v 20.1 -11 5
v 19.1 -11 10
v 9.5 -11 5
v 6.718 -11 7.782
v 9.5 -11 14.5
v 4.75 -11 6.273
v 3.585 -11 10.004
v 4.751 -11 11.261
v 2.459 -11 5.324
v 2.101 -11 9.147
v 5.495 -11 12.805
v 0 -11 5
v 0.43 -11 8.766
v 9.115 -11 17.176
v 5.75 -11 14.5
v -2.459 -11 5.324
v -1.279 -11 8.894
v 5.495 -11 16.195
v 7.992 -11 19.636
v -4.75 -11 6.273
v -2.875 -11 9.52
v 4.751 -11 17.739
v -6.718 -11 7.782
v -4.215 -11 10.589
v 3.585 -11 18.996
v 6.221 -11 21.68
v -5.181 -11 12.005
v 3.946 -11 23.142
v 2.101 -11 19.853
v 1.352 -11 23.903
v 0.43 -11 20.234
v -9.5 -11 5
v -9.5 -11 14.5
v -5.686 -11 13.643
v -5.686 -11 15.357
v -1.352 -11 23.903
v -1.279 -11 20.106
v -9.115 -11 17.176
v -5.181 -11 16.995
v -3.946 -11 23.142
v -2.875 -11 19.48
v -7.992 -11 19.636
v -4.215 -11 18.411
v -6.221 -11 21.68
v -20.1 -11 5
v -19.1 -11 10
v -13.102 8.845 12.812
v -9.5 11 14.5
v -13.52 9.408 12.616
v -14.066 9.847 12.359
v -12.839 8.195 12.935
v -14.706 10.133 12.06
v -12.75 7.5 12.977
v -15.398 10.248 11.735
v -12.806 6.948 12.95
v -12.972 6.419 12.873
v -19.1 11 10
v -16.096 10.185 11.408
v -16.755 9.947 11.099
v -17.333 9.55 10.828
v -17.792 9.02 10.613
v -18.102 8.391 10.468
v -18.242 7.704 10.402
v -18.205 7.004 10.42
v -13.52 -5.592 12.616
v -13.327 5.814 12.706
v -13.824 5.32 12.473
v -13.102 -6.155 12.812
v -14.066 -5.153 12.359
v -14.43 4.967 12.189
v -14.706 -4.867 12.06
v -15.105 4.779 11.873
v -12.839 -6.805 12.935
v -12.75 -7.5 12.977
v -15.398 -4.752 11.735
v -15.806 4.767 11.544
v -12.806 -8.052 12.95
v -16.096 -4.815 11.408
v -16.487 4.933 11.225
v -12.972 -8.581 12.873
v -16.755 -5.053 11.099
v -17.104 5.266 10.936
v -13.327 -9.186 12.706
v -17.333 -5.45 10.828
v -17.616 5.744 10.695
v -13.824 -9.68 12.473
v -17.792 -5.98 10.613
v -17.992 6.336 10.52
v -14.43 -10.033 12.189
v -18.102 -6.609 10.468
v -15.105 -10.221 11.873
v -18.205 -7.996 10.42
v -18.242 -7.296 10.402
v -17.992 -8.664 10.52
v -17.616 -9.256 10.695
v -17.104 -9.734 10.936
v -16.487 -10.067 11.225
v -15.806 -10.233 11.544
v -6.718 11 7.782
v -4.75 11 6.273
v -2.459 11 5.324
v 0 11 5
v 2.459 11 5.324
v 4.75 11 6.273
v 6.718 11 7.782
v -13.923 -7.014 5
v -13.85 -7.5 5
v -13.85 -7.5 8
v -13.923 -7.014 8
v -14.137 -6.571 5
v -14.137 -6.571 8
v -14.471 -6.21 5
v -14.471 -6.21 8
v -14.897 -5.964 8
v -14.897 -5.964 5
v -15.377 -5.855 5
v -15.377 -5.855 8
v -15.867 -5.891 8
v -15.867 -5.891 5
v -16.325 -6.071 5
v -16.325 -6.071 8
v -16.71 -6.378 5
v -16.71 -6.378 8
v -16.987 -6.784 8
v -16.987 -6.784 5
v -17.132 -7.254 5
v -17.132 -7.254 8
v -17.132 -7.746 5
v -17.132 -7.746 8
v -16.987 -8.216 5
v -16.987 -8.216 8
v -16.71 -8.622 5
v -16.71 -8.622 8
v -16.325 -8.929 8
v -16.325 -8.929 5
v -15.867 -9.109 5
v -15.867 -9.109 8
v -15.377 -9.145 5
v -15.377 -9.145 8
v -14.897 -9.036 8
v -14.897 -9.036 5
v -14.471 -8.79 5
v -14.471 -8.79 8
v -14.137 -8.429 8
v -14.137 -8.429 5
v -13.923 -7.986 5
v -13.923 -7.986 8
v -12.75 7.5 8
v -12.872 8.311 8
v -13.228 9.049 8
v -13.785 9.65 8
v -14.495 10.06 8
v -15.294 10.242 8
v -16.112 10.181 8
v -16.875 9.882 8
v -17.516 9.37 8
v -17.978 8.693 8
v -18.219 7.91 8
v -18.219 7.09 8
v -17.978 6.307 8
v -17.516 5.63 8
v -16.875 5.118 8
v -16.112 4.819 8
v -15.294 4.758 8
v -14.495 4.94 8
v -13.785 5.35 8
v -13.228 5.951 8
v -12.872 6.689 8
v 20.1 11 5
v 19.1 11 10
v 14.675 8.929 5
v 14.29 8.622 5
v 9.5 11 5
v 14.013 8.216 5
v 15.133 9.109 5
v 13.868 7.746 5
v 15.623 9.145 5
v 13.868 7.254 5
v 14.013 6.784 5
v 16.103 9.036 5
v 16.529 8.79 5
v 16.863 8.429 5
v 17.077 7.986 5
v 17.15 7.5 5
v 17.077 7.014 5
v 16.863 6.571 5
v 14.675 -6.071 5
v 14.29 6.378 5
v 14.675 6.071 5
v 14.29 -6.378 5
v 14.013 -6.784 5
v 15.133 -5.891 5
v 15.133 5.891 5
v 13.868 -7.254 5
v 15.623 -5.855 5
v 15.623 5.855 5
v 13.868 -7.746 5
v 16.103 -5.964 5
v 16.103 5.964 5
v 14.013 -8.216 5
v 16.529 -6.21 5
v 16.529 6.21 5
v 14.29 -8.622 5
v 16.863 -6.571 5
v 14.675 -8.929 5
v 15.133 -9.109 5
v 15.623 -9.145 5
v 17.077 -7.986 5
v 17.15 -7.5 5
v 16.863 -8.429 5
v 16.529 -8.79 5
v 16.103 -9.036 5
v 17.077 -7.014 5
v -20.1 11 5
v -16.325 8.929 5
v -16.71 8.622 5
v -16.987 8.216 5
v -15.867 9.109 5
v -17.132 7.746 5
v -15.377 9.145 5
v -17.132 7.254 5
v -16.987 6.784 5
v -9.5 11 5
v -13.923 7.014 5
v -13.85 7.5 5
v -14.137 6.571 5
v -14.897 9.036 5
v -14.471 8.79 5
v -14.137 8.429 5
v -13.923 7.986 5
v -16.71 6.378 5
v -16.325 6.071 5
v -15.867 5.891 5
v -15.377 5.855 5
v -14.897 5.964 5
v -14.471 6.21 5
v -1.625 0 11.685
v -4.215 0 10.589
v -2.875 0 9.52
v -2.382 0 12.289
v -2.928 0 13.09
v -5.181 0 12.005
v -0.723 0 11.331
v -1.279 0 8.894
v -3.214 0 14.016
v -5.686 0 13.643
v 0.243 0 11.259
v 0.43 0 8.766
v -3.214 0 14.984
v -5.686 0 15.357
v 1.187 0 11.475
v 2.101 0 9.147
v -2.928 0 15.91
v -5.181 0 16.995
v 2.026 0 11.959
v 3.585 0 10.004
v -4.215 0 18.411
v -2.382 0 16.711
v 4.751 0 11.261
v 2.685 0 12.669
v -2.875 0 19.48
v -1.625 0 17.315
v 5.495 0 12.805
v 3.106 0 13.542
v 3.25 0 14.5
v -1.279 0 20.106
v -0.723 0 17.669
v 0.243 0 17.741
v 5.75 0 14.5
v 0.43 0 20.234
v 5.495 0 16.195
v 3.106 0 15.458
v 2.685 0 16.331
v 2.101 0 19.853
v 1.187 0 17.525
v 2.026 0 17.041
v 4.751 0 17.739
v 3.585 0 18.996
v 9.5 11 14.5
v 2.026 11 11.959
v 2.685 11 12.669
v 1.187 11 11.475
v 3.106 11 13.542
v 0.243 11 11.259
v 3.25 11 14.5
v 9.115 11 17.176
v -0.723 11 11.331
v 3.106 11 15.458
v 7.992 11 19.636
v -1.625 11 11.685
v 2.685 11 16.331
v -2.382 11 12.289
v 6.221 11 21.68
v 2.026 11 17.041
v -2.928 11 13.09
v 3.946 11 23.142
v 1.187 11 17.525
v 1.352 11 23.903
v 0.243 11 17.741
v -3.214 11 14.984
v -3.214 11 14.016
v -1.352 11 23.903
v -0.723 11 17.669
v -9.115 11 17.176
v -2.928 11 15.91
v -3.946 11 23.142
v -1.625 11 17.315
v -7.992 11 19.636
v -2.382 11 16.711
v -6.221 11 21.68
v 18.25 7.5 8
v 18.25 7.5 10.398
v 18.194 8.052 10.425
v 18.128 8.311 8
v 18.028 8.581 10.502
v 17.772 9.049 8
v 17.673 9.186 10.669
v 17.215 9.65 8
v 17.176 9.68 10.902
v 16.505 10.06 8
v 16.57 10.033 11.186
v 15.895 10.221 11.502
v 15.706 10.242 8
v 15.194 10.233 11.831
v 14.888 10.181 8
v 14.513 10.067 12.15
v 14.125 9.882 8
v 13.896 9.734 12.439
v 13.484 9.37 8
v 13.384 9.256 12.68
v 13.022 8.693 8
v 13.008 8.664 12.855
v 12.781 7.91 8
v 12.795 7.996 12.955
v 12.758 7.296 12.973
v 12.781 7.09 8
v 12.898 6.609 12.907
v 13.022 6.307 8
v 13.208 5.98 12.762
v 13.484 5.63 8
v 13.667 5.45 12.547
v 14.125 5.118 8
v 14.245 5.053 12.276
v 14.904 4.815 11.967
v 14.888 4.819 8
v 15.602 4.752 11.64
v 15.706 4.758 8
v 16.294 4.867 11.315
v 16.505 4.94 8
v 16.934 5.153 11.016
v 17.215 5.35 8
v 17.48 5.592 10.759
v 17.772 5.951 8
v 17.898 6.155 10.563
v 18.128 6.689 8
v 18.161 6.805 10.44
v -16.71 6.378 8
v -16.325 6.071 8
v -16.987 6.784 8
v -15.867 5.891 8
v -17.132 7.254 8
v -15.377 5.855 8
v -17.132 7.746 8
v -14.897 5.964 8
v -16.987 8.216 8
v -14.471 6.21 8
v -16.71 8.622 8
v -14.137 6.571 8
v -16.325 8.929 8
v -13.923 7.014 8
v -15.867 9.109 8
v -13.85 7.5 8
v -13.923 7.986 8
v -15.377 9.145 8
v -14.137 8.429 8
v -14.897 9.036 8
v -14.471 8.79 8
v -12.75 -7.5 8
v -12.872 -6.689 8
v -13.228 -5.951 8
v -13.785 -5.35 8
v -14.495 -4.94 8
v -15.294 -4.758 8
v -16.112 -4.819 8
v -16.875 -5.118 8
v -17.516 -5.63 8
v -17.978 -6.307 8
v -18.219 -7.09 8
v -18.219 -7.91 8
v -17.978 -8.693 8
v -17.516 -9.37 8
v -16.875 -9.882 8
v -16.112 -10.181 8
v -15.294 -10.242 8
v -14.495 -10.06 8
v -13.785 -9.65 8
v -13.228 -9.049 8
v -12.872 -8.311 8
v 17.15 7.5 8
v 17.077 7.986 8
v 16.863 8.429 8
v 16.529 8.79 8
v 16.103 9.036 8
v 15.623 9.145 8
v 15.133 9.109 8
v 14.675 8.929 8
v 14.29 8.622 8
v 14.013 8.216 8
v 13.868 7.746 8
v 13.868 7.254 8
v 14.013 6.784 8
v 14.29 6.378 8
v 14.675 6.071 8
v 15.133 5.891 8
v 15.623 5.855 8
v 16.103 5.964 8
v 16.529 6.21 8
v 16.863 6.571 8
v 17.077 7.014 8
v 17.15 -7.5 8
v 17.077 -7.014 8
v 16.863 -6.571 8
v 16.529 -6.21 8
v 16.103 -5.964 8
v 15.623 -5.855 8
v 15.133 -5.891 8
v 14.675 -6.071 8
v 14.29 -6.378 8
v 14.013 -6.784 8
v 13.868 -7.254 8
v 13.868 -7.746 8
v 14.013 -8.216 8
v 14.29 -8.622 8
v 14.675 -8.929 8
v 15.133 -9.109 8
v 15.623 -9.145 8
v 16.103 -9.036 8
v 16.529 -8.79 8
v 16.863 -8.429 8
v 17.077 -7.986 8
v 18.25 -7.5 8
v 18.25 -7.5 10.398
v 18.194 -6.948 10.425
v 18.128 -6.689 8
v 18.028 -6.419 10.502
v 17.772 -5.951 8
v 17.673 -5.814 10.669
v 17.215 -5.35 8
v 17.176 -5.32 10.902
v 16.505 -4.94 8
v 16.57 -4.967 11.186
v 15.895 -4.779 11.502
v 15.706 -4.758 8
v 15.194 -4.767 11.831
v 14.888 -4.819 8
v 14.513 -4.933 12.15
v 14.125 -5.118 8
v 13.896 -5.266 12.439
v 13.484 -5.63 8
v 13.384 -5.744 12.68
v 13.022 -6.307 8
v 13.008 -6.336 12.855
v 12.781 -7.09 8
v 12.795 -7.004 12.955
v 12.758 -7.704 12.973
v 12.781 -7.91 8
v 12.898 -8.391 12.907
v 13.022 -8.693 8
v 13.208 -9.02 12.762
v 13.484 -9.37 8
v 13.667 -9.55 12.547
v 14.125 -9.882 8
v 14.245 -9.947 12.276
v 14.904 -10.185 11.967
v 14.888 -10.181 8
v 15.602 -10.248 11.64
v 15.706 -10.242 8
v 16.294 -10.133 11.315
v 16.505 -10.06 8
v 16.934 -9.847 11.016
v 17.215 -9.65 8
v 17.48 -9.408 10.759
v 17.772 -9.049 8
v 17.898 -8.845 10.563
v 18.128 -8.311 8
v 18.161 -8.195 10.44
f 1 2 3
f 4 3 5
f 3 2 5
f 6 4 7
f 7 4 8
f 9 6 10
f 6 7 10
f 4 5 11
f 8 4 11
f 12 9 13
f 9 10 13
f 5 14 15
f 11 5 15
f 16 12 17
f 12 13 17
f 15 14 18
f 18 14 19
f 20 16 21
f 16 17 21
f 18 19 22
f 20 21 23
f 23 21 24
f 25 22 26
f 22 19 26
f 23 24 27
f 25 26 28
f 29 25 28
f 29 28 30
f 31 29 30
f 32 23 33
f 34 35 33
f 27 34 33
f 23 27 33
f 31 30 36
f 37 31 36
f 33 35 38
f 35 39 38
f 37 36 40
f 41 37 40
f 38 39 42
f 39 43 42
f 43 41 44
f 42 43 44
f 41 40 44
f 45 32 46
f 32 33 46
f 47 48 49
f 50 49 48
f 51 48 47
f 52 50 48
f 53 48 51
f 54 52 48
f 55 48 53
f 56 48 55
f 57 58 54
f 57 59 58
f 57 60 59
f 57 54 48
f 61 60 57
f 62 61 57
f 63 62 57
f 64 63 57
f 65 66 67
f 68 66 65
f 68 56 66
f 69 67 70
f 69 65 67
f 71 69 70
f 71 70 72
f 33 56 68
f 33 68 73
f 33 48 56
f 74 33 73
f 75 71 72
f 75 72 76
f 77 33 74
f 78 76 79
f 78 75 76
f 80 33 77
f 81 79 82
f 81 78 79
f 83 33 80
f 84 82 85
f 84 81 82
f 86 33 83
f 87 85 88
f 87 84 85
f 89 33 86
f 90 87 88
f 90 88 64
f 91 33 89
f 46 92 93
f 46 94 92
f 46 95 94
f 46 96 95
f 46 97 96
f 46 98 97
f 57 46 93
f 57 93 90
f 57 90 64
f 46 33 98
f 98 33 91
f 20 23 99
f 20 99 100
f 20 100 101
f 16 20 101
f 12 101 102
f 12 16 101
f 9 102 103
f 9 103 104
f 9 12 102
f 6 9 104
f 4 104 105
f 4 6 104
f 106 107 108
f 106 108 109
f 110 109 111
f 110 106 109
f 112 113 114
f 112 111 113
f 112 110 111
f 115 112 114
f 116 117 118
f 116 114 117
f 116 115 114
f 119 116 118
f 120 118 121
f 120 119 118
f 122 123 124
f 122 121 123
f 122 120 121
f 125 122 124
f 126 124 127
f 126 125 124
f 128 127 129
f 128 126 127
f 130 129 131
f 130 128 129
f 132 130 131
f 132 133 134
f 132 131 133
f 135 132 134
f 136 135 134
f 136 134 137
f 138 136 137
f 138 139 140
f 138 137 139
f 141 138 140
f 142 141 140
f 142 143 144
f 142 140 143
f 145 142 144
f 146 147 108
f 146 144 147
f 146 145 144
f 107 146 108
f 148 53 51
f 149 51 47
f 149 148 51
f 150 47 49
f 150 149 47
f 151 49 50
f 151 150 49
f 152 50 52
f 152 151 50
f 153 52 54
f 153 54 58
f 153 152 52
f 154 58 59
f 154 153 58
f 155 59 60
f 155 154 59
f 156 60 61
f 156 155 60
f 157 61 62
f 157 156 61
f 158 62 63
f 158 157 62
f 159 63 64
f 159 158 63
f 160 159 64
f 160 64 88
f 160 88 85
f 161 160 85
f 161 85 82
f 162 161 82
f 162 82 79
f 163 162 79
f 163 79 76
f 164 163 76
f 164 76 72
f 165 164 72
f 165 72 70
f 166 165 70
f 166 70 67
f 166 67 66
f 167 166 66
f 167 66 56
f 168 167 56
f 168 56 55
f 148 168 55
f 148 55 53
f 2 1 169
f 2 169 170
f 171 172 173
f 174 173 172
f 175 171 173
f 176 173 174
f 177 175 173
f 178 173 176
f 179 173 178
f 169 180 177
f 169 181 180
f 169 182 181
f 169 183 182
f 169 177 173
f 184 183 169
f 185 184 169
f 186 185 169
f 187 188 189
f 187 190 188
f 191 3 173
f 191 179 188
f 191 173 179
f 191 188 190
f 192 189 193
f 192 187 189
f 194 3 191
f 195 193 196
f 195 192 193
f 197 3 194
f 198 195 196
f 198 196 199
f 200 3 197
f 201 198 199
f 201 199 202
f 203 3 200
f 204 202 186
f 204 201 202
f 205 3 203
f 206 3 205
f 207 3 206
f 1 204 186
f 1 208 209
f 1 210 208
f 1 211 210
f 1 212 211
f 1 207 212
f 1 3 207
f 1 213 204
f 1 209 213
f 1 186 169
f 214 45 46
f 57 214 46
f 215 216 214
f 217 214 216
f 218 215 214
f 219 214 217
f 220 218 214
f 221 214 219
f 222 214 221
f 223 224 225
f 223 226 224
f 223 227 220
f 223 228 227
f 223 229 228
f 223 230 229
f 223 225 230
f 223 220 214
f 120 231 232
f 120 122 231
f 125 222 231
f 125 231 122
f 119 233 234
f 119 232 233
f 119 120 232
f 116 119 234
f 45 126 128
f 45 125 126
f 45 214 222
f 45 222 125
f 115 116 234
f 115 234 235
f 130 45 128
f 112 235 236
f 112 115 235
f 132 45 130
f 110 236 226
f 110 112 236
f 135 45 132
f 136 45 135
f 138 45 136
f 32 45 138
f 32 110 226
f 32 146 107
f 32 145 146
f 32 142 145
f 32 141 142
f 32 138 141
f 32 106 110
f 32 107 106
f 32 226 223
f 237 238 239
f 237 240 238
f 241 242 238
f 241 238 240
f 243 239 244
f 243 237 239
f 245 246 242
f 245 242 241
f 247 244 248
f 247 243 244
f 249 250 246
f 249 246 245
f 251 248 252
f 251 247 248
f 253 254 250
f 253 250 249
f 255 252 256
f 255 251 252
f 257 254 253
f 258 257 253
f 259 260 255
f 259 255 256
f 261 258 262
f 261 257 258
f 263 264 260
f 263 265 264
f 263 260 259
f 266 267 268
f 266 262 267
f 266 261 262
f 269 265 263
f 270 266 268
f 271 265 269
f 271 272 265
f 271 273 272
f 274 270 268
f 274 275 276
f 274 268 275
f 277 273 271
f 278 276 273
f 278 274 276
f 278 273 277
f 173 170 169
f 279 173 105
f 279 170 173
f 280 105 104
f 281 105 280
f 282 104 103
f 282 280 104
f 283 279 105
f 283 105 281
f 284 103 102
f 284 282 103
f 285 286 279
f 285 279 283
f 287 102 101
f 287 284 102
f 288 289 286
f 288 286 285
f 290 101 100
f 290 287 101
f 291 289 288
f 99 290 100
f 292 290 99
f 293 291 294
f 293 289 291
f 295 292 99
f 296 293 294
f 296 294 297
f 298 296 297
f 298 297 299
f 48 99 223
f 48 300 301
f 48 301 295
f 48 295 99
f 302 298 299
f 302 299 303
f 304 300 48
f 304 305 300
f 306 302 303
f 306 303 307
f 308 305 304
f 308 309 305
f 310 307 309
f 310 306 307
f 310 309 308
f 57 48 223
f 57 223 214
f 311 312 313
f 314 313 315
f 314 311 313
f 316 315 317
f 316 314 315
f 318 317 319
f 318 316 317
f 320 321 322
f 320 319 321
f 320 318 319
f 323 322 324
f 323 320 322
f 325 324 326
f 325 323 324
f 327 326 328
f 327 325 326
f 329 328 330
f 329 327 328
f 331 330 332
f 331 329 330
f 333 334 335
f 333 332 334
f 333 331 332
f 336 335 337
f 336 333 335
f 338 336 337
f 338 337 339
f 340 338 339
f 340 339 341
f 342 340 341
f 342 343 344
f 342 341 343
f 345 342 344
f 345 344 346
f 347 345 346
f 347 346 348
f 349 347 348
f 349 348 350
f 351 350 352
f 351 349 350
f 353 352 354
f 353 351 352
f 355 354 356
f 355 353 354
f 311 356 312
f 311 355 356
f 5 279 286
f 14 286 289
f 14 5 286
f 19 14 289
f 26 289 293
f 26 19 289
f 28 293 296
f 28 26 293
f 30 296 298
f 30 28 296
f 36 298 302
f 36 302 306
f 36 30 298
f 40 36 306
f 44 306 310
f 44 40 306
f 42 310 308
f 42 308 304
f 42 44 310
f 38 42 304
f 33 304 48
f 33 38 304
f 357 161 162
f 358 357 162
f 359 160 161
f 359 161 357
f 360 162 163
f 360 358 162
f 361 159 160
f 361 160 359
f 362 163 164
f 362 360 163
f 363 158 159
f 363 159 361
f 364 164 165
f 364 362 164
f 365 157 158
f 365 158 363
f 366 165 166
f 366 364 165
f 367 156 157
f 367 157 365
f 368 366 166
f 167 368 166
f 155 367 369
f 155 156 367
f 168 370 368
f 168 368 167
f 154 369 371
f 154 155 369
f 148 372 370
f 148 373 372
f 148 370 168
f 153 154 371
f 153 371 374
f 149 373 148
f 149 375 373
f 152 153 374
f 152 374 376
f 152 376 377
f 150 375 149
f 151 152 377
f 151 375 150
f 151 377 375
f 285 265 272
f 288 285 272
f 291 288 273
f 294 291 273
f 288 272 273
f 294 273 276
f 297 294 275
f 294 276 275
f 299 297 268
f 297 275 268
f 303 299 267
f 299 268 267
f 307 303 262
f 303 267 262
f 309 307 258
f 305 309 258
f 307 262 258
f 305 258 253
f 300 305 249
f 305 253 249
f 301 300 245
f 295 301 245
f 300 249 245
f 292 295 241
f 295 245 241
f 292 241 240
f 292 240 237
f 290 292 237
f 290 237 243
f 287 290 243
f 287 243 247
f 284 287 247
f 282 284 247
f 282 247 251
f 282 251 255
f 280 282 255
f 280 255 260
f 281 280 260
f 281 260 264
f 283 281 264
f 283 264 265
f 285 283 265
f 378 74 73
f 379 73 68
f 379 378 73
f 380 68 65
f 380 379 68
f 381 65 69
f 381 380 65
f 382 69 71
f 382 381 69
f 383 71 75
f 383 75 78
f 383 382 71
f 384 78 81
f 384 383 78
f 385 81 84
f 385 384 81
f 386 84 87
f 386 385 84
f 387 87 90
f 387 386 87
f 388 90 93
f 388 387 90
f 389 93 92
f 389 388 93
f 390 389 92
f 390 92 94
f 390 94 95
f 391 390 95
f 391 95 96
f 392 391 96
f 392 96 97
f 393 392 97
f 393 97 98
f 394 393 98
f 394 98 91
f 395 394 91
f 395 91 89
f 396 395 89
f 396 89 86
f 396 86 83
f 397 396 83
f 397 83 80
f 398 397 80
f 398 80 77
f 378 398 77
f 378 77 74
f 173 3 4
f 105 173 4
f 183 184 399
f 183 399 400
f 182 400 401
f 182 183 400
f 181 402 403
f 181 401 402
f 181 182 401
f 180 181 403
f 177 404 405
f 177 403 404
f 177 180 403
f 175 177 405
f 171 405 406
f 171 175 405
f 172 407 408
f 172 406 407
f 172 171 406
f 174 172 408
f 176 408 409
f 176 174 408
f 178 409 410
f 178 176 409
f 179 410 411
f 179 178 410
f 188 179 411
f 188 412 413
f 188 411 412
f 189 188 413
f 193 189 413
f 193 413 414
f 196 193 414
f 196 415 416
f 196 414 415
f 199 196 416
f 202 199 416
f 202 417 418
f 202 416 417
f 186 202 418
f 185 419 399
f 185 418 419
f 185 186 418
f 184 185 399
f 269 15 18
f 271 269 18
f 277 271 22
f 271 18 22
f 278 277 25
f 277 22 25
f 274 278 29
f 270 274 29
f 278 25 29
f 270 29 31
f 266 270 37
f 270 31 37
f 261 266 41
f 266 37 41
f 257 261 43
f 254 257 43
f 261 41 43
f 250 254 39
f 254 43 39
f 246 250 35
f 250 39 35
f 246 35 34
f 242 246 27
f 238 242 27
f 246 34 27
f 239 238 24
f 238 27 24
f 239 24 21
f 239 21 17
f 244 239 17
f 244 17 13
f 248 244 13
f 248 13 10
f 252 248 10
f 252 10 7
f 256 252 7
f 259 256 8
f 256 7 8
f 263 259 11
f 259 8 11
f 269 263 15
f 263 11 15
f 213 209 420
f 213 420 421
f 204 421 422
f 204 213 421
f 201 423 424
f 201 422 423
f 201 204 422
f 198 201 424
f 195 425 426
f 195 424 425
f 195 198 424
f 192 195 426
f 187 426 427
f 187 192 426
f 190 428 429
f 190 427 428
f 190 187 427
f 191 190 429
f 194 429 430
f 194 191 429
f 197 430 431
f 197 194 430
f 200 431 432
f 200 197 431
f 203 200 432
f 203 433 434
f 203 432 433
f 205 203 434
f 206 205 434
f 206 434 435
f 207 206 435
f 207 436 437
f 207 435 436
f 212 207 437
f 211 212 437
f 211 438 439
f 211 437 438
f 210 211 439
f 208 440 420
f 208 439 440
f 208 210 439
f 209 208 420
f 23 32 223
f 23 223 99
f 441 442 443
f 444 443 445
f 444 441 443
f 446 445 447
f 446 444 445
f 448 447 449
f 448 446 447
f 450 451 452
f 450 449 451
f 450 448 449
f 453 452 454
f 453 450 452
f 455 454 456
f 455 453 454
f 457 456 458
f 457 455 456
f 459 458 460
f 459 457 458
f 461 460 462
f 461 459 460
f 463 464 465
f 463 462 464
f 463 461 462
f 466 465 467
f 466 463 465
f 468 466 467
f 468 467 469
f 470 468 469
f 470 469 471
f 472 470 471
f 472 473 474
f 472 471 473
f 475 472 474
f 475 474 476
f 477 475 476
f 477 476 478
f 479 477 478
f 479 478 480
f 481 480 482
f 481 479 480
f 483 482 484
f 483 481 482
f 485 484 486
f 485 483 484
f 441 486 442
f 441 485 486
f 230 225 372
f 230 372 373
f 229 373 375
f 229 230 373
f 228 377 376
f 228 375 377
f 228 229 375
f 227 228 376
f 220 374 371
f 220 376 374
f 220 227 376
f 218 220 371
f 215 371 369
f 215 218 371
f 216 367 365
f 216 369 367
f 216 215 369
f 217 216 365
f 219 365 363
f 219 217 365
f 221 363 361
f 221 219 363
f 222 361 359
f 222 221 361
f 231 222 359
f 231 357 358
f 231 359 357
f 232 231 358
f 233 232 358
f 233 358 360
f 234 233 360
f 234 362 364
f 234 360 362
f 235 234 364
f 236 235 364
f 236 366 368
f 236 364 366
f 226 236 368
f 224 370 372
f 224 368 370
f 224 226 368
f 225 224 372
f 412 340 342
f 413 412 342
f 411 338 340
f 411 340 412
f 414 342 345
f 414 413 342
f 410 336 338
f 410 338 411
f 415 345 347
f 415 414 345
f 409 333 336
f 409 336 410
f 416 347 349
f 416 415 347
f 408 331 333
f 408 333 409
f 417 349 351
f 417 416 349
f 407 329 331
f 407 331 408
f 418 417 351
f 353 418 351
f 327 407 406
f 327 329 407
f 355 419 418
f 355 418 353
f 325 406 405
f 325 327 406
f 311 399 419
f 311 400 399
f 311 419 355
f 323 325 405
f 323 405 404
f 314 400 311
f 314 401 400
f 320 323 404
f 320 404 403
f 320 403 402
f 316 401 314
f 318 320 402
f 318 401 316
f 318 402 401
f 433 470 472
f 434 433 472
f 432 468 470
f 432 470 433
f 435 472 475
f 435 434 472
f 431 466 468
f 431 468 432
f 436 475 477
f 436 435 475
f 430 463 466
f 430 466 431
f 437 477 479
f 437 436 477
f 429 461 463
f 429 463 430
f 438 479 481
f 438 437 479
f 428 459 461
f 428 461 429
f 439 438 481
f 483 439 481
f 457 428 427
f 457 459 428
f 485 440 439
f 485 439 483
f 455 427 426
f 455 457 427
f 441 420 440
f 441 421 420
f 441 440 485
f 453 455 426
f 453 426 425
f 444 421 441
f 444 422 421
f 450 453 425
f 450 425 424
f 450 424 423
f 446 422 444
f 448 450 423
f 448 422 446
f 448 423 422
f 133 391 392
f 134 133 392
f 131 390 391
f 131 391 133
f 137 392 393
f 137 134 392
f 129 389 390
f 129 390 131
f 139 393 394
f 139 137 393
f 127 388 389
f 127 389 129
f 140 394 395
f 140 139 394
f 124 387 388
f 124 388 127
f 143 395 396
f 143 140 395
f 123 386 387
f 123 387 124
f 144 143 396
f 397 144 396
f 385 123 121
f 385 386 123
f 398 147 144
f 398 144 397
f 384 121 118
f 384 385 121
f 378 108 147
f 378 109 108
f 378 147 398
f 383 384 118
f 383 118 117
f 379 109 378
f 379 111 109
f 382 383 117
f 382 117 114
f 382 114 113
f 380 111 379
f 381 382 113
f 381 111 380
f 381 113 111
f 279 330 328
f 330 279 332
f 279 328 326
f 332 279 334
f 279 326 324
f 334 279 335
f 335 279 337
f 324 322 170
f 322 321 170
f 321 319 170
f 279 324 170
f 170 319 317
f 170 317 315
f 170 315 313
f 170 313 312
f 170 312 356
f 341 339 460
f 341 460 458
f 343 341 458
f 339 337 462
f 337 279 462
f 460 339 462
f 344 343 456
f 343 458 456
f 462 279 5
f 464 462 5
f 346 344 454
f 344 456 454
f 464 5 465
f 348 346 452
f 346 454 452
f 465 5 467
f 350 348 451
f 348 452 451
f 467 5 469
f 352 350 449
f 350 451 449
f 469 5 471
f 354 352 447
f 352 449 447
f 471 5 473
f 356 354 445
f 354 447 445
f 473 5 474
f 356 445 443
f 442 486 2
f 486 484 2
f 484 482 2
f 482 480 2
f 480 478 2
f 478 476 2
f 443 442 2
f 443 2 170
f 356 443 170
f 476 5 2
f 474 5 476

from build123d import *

# Parameters (mm, degrees)
PAD001_DEPTH    = 22
SKETCH005_R     = 1.65
POCKET003_DEPTH = 24.001
SKETCH006_R     = 2.75
POCKET004_DEPTH = 16.001
SKETCH007_R     = 3.25
POCKET005_DEPTH = 61.001
SKETCH008_R     = 5.75
POCKET006_DEPTH = 11


with BuildPart() as part:
    # Sketch004 → Pad001 (new body)
    with BuildSketch(Plane.XZ.offset(11)):
        with BuildLine():
            Line((-20.1, 5), (-19.1, 10))
            Line((-9.5, 14.5), (-19.1, 10))
            ThreePointArc((9.5, 14.5), (0, 24), (-9.5, 14.5))
            Line((9.5, 14.5), (19.1, 10))
            Line((20.1, 5), (19.1, 10))
            Line((9.5, 5), (20.1, 5))
            Line((9.5, 5), (6.717514, 7.782486))
            ThreePointArc((-6.717514, 7.782486), (0, 5), (6.717514, 7.782486))
            Line((-9.5, 5), (-6.717514, 7.782486))
            Line((-20.1, 5), (-9.5, 5))
        make_face()
    extrude(amount=-PAD001_DEPTH)

    # Sketch005 → Pocket003 (cut, through all)
    with BuildSketch(Plane.XY):
        with Locations((-15.5, 7.5)):
            Circle(SKETCH005_R)
        with Locations((15.5, 7.5)):
            Circle(SKETCH005_R)
        with Locations((15.5, -7.5)):
            Circle(SKETCH005_R)
        with Locations((-15.5, -7.5)):
            Circle(SKETCH005_R)
    extrude(amount=POCKET003_DEPTH, mode=Mode.SUBTRACT)

    # Sketch006 → Pocket004 (cut, through all)
    with BuildSketch(Plane.XY.offset(8)):
        with Locations((-15.5, 7.5)):
            Circle(SKETCH006_R)
        with Locations((-15.5, -7.5)):
            Circle(SKETCH006_R)
        with Locations((15.5, 7.5)):
            Circle(SKETCH006_R)
        with Locations((15.5, -7.5)):
            Circle(SKETCH006_R)
    extrude(amount=POCKET004_DEPTH, mode=Mode.SUBTRACT)

    # Sketch007 → Pocket005 (cut, through all)
    with BuildSketch(Plane.XZ.offset(50)):
        with Locations((0, 14.5)):
            Circle(SKETCH007_R)
    extrude(amount=-POCKET005_DEPTH, mode=Mode.SUBTRACT)

    # Sketch008 → Pocket006 (cut)
    with BuildSketch(Plane.XZ.offset(11)):
        with Locations((0, 14.5)):
            Circle(SKETCH008_R)
    extrude(amount=-POCKET006_DEPTH, mode=Mode.SUBTRACT)


solid = part.part
